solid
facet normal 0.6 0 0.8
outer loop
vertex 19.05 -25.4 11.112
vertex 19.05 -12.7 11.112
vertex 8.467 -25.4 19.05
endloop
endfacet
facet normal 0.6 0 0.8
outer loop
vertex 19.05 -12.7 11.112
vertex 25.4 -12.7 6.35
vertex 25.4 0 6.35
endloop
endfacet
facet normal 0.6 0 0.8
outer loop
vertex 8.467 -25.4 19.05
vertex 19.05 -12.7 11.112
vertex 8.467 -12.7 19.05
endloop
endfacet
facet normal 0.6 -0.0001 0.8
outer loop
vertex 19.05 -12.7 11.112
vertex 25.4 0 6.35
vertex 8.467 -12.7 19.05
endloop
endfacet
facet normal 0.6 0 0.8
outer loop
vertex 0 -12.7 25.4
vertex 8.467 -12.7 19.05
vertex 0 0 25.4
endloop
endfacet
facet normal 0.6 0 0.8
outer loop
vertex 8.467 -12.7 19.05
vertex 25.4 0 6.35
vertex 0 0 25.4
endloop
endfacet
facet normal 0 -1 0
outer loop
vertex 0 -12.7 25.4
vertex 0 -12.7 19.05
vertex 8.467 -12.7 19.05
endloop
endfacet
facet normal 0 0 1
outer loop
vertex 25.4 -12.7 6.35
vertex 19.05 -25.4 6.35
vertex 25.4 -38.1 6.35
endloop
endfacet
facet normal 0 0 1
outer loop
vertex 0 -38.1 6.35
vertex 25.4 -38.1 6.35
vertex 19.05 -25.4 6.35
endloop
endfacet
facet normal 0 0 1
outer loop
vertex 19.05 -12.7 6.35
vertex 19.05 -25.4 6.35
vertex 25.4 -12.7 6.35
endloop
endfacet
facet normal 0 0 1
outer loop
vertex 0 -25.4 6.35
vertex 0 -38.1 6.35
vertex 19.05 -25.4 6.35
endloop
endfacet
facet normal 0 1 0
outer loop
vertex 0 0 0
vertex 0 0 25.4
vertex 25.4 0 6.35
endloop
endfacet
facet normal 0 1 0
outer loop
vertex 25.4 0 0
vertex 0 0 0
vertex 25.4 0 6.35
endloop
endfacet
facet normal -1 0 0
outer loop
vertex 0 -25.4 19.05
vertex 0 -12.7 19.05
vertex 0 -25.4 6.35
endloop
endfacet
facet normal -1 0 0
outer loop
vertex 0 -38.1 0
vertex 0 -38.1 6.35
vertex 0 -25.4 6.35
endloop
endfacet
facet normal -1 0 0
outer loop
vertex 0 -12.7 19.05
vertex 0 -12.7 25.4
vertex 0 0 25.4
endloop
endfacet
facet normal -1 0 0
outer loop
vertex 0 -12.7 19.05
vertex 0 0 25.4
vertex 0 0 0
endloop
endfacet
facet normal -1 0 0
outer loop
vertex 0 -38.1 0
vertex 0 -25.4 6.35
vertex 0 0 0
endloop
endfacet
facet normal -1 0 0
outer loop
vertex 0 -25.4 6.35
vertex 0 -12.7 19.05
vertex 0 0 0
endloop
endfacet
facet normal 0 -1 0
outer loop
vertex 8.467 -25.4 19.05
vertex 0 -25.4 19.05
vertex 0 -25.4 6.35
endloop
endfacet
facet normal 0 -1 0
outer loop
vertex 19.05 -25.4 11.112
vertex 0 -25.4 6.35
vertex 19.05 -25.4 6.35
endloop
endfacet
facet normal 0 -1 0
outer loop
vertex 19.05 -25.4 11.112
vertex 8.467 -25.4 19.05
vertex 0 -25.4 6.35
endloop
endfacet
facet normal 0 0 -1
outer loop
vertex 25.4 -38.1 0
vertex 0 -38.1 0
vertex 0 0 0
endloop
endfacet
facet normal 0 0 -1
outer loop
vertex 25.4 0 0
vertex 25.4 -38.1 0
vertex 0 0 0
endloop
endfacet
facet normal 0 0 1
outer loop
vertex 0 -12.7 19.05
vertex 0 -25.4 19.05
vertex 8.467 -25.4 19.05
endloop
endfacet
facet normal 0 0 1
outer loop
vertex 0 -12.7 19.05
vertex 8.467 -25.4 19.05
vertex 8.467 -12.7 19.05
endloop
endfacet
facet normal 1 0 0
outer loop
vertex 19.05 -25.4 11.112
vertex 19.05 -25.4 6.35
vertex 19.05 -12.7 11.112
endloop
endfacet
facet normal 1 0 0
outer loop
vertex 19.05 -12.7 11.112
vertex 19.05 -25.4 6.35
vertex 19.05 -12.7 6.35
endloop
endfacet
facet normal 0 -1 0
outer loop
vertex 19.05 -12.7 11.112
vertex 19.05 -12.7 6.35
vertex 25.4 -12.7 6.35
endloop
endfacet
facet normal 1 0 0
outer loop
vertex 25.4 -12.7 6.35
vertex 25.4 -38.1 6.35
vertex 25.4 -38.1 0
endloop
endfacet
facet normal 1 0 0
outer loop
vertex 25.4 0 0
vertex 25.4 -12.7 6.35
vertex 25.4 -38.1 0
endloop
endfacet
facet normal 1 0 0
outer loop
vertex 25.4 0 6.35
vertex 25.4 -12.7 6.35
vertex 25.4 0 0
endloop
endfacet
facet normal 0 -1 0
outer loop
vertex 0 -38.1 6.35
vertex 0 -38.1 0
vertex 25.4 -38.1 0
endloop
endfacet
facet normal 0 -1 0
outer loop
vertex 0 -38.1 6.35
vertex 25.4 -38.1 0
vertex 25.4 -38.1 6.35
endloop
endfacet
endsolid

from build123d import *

# Parameters (mm, degrees)
F0_W     = 38.1
F0_H     = 6.35
F1_DEPTH = 25.4
F3_DEPTH = 25.4
F4_W     = 12.7
F4_H     = 6.35
F5_DEPTH = 25.401
F6_W     = 6.35
F6_H     = 12.7
F7_DEPTH = 19.051


with BuildPart() as f1:
    # F0 (on Right) → F1 (new body)
    with BuildSketch(Plane.YZ):
        with Locations((-19.05, 3.175)):
            Rectangle(F0_W, F0_H)
    extrude(amount=F1_DEPTH)

    # F2 (on Front) → F3 (join)
    with BuildSketch(Plane.XZ):
        Polygon((0, 25.4), (0, 6.35), (25.4, 6.35), align=None)
    extrude(amount=F3_DEPTH)

    # F4 (on Right) → F5 (cut, through all)
    with BuildSketch(Plane.YZ):
        with Locations((-19.05, 22.225)):
            Rectangle(F4_W, F4_H)
    extrude(amount=F5_DEPTH, mode=Mode.SUBTRACT)

    # F6 (on face) → F7 (cut, through all)
    with BuildSketch(Plane.XY.offset(6.35)):
        with Locations((22.225, -19.05)):
            Rectangle(F6_W, F6_H)
    extrude(amount=F7_DEPTH, mode=Mode.SUBTRACT)


solid = f1.part
